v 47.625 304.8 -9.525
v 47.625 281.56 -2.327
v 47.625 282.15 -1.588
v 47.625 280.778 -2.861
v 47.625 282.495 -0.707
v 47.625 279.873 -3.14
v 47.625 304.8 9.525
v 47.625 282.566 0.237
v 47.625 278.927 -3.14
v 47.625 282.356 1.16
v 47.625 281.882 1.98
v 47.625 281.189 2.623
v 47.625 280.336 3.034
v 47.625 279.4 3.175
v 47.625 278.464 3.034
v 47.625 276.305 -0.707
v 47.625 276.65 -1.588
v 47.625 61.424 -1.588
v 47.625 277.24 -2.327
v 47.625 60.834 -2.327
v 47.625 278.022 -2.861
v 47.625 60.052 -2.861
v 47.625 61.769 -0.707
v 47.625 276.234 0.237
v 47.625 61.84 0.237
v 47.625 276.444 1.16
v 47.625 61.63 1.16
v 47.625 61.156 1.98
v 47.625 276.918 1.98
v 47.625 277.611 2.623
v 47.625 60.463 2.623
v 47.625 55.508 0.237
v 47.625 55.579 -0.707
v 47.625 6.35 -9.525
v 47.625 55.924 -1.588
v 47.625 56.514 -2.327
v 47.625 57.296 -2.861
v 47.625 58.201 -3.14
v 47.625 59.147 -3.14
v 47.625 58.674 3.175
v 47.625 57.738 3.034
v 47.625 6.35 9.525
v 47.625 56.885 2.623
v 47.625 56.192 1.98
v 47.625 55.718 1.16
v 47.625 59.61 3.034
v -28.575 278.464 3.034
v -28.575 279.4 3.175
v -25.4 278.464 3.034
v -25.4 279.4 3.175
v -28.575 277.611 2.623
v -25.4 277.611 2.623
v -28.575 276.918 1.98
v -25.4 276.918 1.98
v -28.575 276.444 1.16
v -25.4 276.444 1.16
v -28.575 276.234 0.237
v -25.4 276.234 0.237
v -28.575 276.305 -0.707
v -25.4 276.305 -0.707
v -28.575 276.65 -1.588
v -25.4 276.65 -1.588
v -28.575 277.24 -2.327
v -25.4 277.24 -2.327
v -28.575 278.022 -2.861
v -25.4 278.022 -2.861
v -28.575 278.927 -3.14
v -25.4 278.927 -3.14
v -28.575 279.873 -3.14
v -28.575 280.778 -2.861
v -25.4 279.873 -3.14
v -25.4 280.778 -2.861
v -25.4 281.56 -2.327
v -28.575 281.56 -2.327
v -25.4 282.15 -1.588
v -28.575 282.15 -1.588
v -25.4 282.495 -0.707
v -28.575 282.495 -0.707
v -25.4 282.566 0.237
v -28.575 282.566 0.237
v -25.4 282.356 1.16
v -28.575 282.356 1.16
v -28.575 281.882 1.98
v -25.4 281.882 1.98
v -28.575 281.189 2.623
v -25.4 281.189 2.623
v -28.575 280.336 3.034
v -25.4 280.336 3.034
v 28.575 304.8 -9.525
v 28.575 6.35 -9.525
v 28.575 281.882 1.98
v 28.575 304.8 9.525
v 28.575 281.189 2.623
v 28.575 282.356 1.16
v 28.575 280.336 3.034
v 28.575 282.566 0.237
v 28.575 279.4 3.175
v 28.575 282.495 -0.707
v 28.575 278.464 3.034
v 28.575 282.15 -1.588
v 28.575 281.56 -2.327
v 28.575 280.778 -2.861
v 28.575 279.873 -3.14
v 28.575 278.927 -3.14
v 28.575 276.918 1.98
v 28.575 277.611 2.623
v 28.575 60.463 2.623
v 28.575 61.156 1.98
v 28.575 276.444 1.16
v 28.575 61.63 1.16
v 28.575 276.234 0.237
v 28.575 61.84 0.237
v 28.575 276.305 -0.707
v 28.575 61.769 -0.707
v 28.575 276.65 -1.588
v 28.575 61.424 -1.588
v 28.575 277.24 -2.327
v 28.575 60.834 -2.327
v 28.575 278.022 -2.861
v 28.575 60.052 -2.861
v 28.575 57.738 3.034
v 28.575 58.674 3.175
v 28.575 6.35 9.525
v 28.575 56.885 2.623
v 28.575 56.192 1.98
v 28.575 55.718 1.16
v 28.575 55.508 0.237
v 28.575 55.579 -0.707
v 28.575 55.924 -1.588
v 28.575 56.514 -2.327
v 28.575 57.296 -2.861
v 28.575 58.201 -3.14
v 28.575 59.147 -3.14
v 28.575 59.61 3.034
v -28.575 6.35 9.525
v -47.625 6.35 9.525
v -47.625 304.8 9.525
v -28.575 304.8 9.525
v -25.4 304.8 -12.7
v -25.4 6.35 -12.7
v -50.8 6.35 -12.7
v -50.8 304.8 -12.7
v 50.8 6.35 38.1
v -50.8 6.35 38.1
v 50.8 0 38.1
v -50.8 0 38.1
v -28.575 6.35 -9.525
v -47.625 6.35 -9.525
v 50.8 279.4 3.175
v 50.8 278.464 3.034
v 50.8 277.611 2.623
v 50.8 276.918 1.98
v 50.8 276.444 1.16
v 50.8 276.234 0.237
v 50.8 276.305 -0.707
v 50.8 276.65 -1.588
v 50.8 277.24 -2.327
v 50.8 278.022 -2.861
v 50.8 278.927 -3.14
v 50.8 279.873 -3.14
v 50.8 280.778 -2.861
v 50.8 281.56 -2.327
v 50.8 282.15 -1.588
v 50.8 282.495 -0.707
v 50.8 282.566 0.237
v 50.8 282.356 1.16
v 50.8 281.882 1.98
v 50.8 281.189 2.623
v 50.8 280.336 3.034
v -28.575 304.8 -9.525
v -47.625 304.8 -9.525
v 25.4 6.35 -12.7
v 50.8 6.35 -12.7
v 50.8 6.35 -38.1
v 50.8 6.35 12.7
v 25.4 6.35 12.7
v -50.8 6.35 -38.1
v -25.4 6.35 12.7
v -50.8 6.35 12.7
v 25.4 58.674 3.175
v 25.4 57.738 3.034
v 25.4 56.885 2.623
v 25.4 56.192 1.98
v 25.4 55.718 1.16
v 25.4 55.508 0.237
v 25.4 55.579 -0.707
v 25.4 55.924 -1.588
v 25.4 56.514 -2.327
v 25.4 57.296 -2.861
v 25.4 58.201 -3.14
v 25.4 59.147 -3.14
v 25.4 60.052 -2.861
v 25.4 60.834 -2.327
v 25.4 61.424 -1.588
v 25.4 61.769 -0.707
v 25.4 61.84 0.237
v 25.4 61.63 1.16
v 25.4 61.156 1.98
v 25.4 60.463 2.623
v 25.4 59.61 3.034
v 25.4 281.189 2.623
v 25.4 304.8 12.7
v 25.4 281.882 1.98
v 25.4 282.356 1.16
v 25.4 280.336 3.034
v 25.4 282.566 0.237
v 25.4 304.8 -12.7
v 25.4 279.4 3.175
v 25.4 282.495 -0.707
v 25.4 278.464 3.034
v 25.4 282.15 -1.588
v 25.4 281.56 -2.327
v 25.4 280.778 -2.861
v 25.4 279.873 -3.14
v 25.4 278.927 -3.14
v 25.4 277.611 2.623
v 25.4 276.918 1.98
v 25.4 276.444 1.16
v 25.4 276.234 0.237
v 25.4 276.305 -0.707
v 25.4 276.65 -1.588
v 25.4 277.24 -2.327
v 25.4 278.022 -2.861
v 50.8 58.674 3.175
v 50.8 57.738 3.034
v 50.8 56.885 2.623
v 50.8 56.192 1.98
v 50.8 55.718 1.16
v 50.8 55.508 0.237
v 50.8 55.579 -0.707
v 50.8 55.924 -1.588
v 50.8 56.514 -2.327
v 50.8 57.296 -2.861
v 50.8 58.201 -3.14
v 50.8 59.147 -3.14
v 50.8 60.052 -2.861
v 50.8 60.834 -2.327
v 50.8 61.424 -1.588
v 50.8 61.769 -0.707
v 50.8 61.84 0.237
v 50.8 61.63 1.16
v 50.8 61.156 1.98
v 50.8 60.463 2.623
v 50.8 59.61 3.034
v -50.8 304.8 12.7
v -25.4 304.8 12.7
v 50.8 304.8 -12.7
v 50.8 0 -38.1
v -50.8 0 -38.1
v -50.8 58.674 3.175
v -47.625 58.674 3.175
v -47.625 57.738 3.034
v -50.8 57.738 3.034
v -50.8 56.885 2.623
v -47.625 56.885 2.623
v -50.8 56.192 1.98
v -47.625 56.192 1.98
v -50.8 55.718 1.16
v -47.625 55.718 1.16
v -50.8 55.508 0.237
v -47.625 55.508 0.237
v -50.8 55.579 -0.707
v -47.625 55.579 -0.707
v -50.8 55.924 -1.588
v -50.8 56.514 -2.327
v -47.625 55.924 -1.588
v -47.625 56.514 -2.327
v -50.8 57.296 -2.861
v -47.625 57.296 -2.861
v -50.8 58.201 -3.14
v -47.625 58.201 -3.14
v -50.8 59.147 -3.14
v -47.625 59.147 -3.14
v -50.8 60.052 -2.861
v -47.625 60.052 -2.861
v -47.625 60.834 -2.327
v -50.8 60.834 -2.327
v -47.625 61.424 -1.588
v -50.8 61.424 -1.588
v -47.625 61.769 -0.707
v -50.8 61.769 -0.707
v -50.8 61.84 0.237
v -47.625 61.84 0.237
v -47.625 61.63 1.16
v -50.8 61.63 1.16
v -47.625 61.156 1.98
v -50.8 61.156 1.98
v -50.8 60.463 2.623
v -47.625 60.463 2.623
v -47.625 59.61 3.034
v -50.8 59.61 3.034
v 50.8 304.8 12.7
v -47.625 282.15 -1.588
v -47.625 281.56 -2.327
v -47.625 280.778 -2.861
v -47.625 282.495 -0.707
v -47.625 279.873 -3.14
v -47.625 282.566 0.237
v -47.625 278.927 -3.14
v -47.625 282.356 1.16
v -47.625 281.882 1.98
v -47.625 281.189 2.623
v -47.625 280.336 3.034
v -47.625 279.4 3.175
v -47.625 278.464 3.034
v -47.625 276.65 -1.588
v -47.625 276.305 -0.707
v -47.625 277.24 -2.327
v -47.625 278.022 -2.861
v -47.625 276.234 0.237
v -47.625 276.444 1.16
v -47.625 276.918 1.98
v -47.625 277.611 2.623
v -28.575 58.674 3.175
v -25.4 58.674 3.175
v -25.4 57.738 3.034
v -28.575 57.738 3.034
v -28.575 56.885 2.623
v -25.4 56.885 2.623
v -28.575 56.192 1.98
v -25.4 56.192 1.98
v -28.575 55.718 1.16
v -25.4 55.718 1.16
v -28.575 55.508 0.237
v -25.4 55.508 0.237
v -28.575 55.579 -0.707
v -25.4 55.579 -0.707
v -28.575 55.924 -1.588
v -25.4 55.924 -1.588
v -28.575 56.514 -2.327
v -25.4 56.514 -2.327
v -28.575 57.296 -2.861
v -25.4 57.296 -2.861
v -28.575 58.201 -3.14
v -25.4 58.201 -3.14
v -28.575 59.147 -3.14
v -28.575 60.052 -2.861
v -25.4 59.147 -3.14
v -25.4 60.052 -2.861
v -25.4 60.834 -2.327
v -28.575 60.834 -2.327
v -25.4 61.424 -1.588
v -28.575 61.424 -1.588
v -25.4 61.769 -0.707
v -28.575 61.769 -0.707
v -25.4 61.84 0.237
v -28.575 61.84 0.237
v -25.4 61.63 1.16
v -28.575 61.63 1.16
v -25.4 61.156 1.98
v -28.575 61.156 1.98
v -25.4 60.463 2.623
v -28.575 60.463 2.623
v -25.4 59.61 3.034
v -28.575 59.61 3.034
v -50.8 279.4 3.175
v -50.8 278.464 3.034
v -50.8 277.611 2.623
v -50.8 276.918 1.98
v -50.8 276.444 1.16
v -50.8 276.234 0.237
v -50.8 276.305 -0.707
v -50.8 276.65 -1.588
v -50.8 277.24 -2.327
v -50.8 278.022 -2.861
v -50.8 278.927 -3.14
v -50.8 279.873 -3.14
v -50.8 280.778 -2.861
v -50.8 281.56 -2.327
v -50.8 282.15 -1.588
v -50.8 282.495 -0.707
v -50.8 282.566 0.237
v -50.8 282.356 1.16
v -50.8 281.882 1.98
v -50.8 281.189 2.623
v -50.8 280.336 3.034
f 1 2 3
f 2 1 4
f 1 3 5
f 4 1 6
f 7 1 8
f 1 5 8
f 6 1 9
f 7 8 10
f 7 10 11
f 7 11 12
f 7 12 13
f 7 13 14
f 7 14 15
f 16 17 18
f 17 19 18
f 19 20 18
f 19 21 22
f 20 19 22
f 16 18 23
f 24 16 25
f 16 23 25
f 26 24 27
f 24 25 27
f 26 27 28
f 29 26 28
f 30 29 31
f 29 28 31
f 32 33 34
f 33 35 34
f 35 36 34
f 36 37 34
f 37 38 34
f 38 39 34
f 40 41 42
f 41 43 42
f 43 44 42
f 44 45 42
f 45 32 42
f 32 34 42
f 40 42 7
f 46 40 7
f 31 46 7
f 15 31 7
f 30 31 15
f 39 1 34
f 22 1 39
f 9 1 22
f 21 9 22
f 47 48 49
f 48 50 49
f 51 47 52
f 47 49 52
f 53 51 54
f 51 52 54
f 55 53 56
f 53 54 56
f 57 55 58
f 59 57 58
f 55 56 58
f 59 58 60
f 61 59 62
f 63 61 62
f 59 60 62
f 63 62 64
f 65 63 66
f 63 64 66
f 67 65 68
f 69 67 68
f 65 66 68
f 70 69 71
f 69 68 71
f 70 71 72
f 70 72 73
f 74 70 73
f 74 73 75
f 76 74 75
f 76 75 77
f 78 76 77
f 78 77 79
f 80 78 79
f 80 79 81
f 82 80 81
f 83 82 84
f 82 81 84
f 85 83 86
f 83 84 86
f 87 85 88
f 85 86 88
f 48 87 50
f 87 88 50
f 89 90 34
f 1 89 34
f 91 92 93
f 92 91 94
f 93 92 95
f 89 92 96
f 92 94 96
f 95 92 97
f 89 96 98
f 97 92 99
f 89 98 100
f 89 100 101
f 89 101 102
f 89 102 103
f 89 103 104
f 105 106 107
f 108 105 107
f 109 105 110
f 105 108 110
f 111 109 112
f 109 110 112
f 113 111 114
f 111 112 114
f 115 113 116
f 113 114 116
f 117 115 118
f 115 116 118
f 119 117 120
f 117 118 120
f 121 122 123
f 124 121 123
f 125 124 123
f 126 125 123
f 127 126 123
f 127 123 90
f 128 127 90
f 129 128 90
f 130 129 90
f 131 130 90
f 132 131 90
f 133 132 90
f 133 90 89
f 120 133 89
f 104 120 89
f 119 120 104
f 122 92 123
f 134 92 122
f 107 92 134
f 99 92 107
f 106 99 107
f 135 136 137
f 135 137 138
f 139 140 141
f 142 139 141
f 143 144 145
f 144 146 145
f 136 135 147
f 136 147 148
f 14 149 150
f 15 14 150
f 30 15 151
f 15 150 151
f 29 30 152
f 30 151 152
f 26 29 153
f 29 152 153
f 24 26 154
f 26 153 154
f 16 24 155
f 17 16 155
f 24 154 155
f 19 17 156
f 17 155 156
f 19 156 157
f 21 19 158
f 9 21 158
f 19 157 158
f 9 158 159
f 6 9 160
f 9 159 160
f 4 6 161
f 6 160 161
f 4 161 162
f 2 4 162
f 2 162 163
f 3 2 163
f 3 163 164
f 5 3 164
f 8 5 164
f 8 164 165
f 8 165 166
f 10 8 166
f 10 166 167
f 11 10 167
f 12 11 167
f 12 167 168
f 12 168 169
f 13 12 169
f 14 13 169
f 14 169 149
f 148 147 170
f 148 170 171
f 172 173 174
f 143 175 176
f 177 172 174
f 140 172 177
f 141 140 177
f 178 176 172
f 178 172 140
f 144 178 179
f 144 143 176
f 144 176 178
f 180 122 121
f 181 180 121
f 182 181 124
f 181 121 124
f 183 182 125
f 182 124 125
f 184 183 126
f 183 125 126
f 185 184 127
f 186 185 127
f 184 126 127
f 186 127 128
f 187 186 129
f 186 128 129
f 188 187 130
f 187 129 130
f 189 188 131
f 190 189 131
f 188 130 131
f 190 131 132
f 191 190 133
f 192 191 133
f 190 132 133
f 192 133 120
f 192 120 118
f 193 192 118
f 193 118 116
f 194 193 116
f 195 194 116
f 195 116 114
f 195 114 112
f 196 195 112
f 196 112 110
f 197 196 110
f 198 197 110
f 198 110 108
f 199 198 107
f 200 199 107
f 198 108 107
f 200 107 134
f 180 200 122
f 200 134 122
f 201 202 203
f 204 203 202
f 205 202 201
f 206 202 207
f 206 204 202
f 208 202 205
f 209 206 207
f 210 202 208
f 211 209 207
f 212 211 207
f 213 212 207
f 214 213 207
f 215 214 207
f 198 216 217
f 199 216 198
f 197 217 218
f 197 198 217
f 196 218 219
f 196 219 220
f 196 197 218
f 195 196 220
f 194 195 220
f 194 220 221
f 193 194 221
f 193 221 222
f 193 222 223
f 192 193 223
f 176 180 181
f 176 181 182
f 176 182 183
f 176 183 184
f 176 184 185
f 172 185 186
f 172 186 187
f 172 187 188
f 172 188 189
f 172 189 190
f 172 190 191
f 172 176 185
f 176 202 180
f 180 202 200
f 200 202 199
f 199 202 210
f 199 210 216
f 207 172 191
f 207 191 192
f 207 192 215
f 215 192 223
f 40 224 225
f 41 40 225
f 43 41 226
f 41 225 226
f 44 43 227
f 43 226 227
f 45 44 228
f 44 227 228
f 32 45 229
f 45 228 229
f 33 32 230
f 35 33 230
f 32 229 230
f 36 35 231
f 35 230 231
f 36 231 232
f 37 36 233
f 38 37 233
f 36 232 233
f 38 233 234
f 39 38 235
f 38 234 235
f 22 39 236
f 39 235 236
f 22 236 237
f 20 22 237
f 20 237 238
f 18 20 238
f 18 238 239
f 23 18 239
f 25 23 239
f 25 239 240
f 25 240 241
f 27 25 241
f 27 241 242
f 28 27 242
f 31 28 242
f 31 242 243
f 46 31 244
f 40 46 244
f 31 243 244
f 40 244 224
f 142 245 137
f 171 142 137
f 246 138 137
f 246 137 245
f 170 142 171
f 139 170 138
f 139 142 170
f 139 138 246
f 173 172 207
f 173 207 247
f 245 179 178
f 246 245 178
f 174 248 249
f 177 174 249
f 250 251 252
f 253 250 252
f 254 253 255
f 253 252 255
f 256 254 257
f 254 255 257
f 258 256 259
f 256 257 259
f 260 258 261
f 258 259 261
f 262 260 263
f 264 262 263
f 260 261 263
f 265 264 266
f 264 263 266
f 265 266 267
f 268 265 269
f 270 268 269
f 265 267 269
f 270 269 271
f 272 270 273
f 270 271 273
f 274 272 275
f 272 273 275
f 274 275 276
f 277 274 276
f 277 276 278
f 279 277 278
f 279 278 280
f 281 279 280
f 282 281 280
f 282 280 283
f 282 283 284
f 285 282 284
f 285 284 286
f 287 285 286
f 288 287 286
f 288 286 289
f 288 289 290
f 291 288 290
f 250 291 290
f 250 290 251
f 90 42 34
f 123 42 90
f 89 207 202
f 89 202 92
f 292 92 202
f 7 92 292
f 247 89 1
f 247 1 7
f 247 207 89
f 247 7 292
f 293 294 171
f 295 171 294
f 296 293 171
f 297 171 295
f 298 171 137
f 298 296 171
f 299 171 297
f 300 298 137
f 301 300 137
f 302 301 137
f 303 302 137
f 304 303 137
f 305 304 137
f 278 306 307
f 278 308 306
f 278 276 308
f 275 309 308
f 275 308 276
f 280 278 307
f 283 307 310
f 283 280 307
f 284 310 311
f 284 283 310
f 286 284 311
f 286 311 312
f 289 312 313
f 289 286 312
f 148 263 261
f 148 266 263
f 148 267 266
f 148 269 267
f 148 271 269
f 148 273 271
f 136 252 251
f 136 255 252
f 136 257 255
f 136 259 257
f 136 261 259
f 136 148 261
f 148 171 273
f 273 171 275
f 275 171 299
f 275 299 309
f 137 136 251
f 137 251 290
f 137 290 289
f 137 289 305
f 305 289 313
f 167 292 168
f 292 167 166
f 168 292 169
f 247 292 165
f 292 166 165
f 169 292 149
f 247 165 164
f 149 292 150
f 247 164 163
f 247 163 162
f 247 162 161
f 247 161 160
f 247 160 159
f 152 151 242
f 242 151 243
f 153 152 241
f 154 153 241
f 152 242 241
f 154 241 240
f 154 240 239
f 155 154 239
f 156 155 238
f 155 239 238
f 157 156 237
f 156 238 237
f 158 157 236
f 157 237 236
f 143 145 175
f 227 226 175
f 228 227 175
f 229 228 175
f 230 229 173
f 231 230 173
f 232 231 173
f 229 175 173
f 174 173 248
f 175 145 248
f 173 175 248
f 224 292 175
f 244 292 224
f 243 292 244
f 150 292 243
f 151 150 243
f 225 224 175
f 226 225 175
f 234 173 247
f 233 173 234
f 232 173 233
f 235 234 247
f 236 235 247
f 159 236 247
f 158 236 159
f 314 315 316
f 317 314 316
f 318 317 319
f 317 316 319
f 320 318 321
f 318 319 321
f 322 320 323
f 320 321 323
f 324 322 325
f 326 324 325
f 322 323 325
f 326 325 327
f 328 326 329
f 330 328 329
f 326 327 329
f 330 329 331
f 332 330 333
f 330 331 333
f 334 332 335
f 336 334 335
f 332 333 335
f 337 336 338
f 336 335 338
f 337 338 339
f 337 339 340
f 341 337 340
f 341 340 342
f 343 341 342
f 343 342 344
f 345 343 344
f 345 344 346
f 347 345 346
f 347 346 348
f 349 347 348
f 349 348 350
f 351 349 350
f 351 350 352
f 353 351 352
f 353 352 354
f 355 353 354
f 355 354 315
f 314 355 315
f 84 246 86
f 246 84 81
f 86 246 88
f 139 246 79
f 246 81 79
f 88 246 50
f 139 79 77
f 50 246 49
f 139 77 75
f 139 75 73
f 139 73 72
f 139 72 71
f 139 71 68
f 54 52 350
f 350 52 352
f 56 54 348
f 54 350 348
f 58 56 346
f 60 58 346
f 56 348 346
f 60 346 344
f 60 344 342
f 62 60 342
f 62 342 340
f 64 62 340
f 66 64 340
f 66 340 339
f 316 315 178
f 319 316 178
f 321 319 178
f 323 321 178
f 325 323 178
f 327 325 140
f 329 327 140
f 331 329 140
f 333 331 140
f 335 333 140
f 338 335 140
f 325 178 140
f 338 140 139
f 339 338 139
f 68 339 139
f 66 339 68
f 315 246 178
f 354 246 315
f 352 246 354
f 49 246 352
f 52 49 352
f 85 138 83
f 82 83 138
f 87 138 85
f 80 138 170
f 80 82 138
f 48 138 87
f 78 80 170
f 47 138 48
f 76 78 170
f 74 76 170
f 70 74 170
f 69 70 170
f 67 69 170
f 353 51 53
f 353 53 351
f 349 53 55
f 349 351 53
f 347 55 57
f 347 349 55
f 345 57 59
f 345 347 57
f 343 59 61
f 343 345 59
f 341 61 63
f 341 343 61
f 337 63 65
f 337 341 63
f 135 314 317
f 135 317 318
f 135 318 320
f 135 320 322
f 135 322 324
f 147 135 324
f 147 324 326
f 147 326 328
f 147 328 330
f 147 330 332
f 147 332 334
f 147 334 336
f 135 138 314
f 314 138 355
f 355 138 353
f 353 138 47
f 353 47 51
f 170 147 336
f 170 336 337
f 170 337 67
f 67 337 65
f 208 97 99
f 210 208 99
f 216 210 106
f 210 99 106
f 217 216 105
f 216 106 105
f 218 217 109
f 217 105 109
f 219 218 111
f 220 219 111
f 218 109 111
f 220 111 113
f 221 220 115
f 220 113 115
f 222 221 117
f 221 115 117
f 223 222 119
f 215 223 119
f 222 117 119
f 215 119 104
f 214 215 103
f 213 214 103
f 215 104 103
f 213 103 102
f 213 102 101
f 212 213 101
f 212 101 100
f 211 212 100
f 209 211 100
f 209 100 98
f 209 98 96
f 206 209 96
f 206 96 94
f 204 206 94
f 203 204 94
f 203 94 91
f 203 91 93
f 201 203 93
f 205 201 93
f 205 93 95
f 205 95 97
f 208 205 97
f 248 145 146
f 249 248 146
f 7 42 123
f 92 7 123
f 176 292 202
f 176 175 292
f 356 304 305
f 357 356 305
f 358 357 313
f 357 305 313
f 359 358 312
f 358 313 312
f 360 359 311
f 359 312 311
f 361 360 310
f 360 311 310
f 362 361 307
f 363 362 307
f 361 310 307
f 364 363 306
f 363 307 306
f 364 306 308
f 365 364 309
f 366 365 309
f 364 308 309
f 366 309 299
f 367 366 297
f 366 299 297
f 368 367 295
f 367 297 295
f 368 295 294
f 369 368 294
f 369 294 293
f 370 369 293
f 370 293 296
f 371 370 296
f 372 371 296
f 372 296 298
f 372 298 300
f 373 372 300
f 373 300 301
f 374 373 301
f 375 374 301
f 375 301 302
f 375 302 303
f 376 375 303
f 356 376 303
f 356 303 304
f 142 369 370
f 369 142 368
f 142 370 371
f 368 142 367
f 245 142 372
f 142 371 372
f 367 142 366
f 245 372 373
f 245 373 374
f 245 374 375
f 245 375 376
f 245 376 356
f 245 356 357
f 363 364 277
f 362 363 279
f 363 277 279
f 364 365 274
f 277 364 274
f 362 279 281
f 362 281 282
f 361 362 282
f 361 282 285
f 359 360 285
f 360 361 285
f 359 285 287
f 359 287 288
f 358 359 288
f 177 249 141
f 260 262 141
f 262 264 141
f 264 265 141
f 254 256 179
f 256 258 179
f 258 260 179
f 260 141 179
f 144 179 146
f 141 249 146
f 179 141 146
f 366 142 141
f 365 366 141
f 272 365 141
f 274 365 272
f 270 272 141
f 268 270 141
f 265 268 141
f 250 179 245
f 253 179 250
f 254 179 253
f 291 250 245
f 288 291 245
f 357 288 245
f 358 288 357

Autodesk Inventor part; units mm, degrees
ref_plane "YZ Plane" through (0, 0, 0) normal (1, 0, 0) x (0, 1, 0)
ref_plane "XZ Plane" through (0, 0, 0) normal (0, 1, 0) x (-1, 0, 0)
ref_plane "XY Plane" through (0, 0, 0) normal (0, 0, 1) x (1, 0, 0)
sketch "Sketch4" plane through (0, 0, 0) normal (0, 1, 0) x (-1, 0, 0)
  line L0 (-50.8, 38.1) -> (-50.8, -38.1)
  line L1 (-50.8, -38.1) -> (50.8, -38.1)
  line L2 (50.8, -38.1) -> (50.8, 38.1)
  line L3 (50.8, 38.1) -> (-50.8, 38.1)
  line L4 (-50.8, 38.1) -> (50.8, -38.1) construction
  line L5 (-50.8, -38.1) -> (50.8, 38.1) construction
  point P0 (0, 0)
  dimension "d14" = 76.2
  dimension "d15" = 101.6
extrude "Extrusion4" add sketch "Sketch4" along normal blind 6.35
sketch "Sketch6" plane through (0, 6.35, 0) normal (0, 1, 0) x (1, 0, 0)
  line L0 (-50.8, 38.1) -> (-50.8, -38.1) construction
  line L1 (-50.8, 0) -> (50.8, 0) construction
  line L2 (50.8, -38.1) -> (50.8, 38.1) construction
  line L3 (-50.8, -12.7) -> (-25.4, -12.7)
  line L4 (-25.4, -12.7) -> (-25.4, 12.7)
  line L5 (-25.4, 12.7) -> (-50.8, 12.7)
  line L6 (-50.8, 12.7) -> (-50.8, -12.7)
  line L7 (-50.8, -12.7) -> (-25.4, 12.7) construction
  line L8 (-25.4, -12.7) -> (-50.8, 12.7) construction
  line L9 (-47.625, -9.525) -> (-28.575, -9.525)
  line L10 (-28.575, -9.525) -> (-28.575, 9.525)
  line L11 (-28.575, 9.525) -> (-47.625, 9.525)
  line L12 (-47.625, 9.525) -> (-47.625, -9.525)
  line L13 (-47.625, -9.525) -> (-28.575, 9.525) construction
  line L14 (-28.575, -9.525) -> (-47.625, 9.525) construction
  line L15 (50.8, 38.1) -> (-50.8, 38.1) construction
  line L16 (0, 38.1) -> (0, -38.1) construction
  line L17 (-50.8, -38.1) -> (50.8, -38.1) construction
  line L18 (50.8, -12.7) -> (25.4, -12.7)
  line L19 (25.4, -12.7) -> (25.4, 12.7)
  line L20 (25.4, 12.7) -> (50.8, 12.7)
  line L21 (50.8, 12.7) -> (50.8, -12.7)
  line L22 (47.625, -9.525) -> (28.575, -9.525)
  line L23 (28.575, -9.525) -> (28.575, 9.525)
  line L24 (28.575, 9.525) -> (47.625, 9.525)
  line L25 (47.625, 9.525) -> (47.625, -9.525)
  point P0 (0, 0)
  point P1 (-38.1, 0)
  dimension "d18" = 25.4
  dimension "d19" = 3.175
extrude "Extrusion5" add sketch "Sketch6" along normal blind 298.45
sketch "Sketch7" plane through (-50.8, 0, -38.1) normal (-1, 0, 0) x (0, 0, 1)
  line L0 (25.4, 304.8) -> (50.8, 304.8) construction
  line L1 (38.1, 304.8) -> (38.1, 0) construction
  point P0 (38.1, 279.4)
  point P1 (38.1, 58.674)
  dimension "d22" = 25.4
  dimension "d24" = 246.126
hole "Hole1" at (-50.8, 279.4, 0) at (-50.8, 58.674, 0) direction (1, 0, 0) diameter 6.35 end through all
equation "\"d14\" = supportLength"
equation "\"d15\" = supportWidth"
equation "\"d16\" = supportFloorThickness"
equation "\"d18\" = supportTubingSize"
equation "\"d19\" = supportWallTubingThickness"
equation "\"d20\" = supportTubingHeight"
equation "\"d22\" = supportAxelDistanceFromTop"
equation "\"d24\" = supportPulleyAxelDistanceFromTop"
equation "\"d25\" = supportAxelDiam"
equation "\"supportHeight\" = 304.8"
equation "\"supportWidth\" = 101.6"
equation "\"supportLength\" = 76.2"
equation "\"supportSideHoleDiam\" = 6.35"
equation "\"supporttTopWidth\" = 25.4"
equation "\"supportSupportWidth\" = 101.6"
equation "\"supportSupportPullyHeight\" = 127"
equation "\"supportWallTubingThickness\" = 3.175"
equation "\"supportFloorThickness\" = 6.35"
equation "\"supportTubingHeight\" = supportHeight - supportFloorThickness"
equation "\"supportTubingSize\" = 25.4"
equation "\"supportAxelDistanceFromTop\" = 25.4"
equation "\"supportPulleyAxelDistanceFromTop\" = 246.126"
equation "\"supportAxelDiam\" = 6.35"
properties part number "catapultArmSupportStructure"
